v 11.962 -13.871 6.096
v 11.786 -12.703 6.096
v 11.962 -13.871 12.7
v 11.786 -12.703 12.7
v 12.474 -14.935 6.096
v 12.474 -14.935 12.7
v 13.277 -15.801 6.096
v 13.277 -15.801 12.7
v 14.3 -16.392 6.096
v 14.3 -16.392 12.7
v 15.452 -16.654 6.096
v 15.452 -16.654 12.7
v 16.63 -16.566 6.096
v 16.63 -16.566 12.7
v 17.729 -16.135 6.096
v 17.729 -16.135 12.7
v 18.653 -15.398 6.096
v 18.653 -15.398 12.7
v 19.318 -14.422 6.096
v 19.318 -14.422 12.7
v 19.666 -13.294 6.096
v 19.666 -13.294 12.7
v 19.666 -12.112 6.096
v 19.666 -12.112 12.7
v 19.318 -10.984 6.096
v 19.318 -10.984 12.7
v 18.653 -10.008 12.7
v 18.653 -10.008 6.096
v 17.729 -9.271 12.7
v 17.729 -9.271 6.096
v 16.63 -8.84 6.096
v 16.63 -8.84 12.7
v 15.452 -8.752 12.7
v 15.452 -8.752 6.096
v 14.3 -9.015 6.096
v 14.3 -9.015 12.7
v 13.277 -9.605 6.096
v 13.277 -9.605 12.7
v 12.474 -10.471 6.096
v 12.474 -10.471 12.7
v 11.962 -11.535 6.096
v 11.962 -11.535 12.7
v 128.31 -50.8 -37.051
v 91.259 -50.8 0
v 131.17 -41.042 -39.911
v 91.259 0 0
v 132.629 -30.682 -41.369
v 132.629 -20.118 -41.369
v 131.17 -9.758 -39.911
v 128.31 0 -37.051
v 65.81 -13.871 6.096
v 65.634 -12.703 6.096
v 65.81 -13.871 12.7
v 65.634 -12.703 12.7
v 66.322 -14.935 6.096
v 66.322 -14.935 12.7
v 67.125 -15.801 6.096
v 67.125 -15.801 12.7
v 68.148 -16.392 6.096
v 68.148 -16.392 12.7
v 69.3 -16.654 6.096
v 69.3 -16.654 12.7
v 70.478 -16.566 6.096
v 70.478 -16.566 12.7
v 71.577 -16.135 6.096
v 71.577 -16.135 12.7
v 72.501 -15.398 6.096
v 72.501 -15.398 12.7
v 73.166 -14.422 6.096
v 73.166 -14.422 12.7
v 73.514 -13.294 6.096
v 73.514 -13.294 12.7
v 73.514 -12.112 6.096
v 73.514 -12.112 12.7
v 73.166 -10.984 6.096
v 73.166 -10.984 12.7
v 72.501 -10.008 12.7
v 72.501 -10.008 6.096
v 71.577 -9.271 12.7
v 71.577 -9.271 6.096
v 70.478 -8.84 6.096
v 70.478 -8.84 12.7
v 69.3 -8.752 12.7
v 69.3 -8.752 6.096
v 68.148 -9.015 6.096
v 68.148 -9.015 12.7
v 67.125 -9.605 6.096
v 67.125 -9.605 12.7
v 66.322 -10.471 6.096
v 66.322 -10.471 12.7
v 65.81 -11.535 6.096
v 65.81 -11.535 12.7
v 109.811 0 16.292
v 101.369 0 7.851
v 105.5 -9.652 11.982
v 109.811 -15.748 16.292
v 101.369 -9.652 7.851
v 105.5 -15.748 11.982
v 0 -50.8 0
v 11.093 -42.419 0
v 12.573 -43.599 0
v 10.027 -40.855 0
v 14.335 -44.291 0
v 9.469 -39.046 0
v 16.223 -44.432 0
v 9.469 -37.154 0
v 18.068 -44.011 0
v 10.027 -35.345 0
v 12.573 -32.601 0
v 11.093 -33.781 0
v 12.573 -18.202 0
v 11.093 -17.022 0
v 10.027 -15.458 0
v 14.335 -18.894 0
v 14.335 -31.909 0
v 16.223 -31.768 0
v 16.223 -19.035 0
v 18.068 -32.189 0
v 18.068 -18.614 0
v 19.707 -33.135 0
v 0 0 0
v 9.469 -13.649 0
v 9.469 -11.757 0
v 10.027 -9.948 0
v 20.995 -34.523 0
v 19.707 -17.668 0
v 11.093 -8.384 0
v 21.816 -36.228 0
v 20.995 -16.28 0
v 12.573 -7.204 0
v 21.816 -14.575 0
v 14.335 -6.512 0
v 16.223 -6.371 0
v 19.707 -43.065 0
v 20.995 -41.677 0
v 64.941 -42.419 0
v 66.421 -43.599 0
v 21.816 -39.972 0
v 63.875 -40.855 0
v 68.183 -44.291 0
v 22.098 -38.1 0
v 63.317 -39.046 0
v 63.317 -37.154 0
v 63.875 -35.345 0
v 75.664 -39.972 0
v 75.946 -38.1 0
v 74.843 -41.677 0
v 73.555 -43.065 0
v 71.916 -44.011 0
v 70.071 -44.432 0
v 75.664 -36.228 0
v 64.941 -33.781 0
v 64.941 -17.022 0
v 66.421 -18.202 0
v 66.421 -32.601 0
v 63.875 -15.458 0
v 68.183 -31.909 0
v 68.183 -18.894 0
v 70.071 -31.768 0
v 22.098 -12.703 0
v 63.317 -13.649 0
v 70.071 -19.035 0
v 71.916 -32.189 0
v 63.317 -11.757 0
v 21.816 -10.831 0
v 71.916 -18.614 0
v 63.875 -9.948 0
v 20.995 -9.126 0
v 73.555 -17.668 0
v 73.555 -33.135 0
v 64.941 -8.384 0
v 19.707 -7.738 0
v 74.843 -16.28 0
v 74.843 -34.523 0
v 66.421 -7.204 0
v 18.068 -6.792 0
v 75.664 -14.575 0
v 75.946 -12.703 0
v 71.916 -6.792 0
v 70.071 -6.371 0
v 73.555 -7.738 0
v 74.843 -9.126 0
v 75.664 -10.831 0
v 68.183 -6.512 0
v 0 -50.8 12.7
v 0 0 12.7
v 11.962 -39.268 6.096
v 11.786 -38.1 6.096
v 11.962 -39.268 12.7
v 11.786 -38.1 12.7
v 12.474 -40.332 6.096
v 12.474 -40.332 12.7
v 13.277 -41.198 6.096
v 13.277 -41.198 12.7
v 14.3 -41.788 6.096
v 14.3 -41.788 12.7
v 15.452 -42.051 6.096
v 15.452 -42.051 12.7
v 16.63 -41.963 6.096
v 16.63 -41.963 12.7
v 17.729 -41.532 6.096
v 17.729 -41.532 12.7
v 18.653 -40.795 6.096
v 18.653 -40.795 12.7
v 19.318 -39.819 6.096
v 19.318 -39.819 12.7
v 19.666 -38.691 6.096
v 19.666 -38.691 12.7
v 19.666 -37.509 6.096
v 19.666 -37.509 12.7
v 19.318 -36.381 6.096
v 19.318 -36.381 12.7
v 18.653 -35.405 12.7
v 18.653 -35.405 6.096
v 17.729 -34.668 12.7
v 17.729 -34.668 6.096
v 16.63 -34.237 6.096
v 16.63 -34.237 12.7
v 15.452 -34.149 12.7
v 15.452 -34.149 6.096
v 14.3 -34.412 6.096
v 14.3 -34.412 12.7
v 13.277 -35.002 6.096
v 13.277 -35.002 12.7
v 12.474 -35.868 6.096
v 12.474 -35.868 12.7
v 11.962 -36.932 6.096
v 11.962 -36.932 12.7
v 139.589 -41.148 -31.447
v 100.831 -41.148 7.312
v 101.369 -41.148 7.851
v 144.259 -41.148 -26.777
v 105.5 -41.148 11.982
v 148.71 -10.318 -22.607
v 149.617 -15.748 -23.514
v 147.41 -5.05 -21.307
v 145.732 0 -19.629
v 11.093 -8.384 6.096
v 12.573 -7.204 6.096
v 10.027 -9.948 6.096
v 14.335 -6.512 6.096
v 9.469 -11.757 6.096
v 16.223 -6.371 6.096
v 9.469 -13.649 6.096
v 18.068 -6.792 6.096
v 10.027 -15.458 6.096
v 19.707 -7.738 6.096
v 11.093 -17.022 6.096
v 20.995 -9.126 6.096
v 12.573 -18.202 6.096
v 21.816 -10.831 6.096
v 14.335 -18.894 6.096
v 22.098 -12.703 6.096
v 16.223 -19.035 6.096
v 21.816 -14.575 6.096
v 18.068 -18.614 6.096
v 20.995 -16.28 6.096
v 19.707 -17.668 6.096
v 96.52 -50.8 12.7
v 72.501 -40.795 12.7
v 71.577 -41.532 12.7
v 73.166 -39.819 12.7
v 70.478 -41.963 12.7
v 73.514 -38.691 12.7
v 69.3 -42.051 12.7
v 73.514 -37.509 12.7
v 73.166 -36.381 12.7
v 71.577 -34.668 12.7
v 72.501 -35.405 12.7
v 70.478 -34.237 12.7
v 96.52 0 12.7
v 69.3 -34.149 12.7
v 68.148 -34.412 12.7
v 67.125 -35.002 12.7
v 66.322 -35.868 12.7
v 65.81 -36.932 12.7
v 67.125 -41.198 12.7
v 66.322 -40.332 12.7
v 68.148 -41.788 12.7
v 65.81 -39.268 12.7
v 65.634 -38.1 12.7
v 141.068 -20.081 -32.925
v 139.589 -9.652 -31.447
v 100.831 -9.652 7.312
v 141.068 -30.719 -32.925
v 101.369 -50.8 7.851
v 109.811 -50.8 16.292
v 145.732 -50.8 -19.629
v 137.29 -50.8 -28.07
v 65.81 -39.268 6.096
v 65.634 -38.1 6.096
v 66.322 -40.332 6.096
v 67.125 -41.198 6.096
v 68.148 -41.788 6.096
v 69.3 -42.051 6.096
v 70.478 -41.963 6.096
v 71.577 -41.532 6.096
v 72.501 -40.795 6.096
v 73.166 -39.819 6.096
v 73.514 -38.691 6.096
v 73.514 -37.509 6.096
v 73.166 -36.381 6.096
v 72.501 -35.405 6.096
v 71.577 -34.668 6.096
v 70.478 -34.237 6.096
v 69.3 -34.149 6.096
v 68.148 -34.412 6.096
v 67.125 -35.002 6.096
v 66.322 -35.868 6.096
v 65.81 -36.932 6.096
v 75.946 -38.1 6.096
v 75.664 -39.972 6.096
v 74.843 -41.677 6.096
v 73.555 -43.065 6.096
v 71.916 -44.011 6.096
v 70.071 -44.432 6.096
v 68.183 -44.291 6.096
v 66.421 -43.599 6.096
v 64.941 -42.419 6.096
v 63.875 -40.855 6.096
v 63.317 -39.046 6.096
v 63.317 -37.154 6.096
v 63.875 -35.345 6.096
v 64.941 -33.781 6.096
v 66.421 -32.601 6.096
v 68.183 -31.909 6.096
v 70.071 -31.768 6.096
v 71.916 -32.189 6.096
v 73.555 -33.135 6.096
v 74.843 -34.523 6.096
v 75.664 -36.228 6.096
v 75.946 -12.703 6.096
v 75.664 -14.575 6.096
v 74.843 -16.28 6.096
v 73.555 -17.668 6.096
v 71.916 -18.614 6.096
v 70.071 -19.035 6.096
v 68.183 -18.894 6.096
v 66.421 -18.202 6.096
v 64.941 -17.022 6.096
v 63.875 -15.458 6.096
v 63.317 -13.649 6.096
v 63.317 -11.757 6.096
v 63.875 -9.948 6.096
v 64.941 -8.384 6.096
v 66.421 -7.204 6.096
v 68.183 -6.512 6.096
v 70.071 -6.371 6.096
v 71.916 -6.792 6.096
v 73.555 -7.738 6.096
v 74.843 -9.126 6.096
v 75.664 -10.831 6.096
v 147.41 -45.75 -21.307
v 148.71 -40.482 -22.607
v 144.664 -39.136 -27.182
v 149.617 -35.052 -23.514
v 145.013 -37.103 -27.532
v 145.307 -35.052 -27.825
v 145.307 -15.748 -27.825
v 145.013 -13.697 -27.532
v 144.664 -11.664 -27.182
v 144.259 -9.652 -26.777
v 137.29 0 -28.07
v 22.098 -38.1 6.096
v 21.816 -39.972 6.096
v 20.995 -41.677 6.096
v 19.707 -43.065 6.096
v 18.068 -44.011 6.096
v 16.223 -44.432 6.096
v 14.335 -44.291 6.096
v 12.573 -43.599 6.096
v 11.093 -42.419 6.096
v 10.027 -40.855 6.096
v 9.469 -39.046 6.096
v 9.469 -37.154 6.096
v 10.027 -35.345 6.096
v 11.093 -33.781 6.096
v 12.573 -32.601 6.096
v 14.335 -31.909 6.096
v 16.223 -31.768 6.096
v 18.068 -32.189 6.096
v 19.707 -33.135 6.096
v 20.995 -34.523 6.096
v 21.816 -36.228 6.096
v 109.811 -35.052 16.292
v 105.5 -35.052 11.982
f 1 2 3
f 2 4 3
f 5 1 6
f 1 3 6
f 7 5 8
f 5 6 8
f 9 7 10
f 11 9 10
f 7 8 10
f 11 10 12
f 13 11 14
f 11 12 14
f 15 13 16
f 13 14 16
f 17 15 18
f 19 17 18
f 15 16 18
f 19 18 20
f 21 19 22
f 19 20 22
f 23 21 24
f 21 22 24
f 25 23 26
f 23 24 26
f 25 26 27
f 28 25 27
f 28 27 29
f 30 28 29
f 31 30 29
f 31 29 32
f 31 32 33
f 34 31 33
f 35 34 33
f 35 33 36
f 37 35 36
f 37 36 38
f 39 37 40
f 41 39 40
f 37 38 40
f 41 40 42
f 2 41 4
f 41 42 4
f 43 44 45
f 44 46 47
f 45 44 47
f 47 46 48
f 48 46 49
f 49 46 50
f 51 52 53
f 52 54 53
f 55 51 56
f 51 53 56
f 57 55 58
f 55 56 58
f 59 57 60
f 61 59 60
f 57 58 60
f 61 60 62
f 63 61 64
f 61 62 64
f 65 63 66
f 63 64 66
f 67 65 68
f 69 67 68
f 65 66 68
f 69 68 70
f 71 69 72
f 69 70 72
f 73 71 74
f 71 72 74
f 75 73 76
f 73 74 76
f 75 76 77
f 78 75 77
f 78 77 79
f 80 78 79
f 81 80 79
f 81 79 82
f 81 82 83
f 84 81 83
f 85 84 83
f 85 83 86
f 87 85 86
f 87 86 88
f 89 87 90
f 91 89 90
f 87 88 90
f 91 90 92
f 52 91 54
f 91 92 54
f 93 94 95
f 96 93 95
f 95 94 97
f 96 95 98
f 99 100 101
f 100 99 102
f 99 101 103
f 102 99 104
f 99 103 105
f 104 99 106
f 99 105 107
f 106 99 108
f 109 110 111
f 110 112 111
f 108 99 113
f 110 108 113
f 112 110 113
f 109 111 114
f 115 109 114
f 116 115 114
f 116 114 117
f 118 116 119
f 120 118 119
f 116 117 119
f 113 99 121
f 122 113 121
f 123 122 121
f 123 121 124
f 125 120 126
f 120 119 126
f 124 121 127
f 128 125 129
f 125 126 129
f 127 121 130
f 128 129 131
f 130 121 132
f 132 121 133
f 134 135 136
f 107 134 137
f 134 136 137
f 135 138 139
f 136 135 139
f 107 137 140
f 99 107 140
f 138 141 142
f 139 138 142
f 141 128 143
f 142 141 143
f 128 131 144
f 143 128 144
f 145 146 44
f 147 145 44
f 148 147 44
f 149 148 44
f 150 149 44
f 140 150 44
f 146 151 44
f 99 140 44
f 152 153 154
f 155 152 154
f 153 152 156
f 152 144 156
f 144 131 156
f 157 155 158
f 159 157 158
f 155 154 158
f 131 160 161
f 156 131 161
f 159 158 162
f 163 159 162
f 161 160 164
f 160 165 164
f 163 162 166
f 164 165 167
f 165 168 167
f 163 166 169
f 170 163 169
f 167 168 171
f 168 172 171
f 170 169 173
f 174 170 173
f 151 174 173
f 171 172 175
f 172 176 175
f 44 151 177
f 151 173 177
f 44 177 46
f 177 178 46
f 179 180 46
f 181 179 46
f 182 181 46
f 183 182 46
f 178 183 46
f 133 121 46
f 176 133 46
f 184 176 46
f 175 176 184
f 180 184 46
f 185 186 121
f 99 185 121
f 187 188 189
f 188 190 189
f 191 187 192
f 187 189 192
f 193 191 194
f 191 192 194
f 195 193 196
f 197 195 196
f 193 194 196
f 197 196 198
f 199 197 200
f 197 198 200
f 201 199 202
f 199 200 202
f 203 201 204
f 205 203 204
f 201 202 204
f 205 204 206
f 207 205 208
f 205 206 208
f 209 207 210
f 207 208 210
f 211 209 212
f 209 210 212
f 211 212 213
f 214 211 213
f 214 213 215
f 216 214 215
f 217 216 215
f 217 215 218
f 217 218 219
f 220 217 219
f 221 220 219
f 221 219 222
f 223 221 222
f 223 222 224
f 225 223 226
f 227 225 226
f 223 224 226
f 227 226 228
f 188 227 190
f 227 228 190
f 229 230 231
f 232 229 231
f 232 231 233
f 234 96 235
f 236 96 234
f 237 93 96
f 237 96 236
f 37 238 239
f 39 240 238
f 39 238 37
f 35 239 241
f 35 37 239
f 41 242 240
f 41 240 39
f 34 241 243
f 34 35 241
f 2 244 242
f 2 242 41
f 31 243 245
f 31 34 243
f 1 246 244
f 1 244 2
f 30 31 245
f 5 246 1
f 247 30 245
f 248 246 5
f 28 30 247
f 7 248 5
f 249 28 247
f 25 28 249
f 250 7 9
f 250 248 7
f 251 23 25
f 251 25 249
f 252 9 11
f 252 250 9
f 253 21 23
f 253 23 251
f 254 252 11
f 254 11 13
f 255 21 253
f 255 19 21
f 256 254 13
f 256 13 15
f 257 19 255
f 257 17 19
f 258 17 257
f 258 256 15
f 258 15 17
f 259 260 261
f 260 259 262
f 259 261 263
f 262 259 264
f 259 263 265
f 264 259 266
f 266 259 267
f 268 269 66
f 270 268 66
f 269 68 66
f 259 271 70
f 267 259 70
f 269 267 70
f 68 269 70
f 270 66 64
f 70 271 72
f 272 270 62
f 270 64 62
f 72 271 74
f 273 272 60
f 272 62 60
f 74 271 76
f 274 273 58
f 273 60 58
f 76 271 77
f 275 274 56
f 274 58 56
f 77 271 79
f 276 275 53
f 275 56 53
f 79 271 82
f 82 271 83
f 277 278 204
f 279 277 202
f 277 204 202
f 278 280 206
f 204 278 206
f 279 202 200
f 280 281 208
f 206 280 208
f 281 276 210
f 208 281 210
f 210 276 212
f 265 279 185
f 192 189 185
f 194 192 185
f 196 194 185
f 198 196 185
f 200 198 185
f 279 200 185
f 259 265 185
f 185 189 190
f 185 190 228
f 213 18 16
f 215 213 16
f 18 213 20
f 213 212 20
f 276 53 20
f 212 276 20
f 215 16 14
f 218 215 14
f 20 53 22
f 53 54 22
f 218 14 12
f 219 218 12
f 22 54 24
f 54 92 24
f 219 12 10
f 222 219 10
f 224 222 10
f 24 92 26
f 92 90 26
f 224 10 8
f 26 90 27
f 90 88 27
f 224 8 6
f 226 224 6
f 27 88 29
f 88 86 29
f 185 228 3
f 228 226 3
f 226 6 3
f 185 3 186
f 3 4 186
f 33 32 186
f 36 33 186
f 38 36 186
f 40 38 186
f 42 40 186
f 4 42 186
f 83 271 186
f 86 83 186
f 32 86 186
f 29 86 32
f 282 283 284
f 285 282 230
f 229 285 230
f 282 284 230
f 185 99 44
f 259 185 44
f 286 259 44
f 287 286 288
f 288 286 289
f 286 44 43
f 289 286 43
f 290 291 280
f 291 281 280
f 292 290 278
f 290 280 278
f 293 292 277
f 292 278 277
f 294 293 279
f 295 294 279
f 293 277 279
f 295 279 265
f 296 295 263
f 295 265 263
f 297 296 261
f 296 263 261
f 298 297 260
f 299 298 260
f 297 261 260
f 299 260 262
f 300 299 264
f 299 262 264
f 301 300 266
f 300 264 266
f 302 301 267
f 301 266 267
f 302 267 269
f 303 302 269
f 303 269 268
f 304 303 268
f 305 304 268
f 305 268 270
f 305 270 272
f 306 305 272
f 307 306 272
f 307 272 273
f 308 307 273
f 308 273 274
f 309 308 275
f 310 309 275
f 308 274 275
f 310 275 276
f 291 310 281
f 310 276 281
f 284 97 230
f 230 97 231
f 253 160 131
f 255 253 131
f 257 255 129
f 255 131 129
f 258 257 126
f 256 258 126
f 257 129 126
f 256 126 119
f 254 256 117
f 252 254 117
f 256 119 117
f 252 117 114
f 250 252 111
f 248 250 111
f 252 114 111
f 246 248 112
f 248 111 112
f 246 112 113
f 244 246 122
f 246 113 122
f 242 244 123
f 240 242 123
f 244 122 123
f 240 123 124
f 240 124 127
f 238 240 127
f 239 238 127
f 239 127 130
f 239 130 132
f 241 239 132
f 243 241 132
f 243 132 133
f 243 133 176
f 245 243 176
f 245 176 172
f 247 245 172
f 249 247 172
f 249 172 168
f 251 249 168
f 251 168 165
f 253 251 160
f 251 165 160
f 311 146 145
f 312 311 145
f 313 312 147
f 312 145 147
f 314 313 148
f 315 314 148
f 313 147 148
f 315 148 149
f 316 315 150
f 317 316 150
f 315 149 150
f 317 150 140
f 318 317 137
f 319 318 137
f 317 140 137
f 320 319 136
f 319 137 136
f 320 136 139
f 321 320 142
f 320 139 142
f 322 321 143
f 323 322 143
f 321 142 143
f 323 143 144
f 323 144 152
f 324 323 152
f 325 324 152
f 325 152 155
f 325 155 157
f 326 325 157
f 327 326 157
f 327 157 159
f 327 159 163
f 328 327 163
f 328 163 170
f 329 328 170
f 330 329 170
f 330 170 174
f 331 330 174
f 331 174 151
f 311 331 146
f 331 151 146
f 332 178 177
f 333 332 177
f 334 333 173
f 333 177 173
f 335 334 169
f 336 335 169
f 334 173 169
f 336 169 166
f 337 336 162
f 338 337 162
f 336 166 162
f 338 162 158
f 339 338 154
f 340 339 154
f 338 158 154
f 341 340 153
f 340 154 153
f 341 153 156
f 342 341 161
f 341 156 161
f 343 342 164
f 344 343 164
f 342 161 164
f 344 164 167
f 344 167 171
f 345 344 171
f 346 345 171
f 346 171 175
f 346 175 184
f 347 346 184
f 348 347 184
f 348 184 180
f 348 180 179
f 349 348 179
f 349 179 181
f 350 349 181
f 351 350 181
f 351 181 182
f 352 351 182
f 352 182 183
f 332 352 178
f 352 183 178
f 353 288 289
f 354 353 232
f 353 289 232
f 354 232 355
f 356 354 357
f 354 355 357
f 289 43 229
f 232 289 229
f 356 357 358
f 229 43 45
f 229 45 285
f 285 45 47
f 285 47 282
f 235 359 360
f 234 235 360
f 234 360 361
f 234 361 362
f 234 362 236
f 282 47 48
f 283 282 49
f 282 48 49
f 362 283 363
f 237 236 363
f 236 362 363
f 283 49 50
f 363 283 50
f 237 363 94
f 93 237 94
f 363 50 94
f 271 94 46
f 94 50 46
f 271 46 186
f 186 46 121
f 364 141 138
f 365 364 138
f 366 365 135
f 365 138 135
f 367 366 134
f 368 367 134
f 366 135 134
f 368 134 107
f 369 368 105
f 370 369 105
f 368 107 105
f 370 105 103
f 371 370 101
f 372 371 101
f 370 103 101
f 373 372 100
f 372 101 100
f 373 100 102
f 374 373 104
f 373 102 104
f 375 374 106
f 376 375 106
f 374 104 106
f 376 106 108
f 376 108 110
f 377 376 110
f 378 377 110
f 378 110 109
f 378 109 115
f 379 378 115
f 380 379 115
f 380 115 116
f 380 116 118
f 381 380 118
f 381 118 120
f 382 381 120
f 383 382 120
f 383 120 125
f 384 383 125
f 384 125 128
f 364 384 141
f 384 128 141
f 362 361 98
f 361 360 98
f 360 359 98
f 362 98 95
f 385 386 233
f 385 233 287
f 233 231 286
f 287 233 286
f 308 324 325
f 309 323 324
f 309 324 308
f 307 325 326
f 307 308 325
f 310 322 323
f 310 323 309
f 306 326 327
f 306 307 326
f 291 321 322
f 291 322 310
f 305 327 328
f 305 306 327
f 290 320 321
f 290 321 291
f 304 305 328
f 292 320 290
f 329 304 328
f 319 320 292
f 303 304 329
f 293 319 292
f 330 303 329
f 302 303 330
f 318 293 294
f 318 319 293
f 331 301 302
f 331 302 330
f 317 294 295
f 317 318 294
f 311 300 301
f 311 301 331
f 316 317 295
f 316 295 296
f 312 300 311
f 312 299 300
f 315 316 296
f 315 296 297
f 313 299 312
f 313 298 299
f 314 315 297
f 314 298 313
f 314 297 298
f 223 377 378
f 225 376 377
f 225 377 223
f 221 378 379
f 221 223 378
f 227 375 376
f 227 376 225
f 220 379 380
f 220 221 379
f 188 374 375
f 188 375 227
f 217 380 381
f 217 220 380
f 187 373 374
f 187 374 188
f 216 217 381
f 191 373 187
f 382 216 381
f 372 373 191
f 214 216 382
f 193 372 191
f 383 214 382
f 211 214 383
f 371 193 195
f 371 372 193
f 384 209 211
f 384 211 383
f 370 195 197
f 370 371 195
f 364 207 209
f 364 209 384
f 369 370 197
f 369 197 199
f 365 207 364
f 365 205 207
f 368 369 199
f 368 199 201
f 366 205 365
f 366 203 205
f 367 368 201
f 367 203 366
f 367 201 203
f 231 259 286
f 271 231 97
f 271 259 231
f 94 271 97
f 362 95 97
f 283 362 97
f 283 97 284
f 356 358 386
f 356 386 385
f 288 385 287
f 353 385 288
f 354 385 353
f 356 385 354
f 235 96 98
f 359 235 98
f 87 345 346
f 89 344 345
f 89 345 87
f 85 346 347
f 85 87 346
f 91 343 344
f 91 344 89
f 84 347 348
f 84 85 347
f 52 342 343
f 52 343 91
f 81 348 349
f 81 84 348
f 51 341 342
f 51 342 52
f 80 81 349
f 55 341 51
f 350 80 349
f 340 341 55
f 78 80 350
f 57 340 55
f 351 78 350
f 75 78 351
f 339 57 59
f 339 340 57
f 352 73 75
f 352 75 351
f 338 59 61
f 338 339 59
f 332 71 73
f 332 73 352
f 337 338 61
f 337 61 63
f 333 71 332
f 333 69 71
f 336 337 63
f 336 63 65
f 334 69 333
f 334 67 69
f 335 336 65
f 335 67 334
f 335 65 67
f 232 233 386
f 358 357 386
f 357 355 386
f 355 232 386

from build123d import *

# Parameters (mm, degrees)
F1_DEPTH        = 50.8
F3_DEPTH        = 12.7
F5_DEPTH        = 11.938
F7_DEPTH        = 76.2
F8_R            = 6.35
F9_DEPTH        = 6.096
F11_D           = 7.9248
F11_CBORE_D     = 12.7
F11_CBORE_DEPTH = 6.096


with BuildPart() as f1:
    # F0 (on Front) → F1 (new body)
    with BuildSketch(Plane.XZ):
        Polygon((0, 12.7), (0, 0), (91.2594877579, 0), (87.5397438789, 3.7197438789), (96.52, 12.7), align=None)
        Polygon((87.5397438789, 3.7197438789), (91.2594877579, 0), (96.52, 0), (96.52, 12.7), align=None)
        Polygon((96.52, 0), (91.2594877579, 0), (128.3101066686, -37.0506189107), (137.2903627897, -28.0703627897), (96.52, 12.7), align=None)
    extrude(amount=F1_DEPTH)

    # F2 (on face) → F3 (join)
    with BuildSketch(Plane(origin=(54.61, 0, 54.61), x_dir=(0.7071067812, 0, -0.7071067812), z_dir=(0.7071067812, 0, 0.7071067812))):
        with BuildLine():
            Line((116.9276903991, 0), (116.9276903991, -50.8))
            ThreePointArc((116.9276903991, -50.8), (123.2946720443, -25.4), (116.9276903991, 0))
        make_face()
    extrude(amount=-F3_DEPTH)

    # F4 (on face) → F5 (join)
    with BuildSketch(Plane(origin=(54.61, 0, 54.61), x_dir=(0.7071067812, 0, -0.7071067812), z_dir=(0.7071067812, 0, 0.7071067812))):
        with BuildLine():
            Line((66.1276903991, -50.8), (116.9276903991, -50.8))
            ThreePointArc((116.9276903991, -50.8), (123.2946720443, -25.4), (116.9276903991, 0))
            Line((116.9276903991, 0), (66.1276903991, 0))
            Line((66.1276903991, 0), (66.1276903991, -50.8))
        make_face()
    extrude(amount=F5_DEPTH)

    # F6 (on face) → F7 (cut)
    with BuildSketch(Plane(origin=(46.7593383054, 0, -46.7593383054), x_dir=(0, -1, 0), z_dir=(-0.7071067812, 0, 0.7071067812))):
        Polygon((35.052, 89.1682026412), (25.4, 89.1682026412), (15.748, 89.1682026412), (15.748, 83.0722026412), (9.652, 83.0722026412), (9.652, 76.4682026412), (41.148, 76.4682026412), (41.148, 83.0722026412), (35.052, 83.0722026412), align=None)
    extrude(amount=-F7_DEPTH, mode=Mode.SUBTRACT)

    # F8 (on face) → F9 (cut)
    with BuildSketch(Plane(origin=(0, 0, 0), x_dir=(1, 0, 0), z_dir=(0, 0, -1))):
        with Locations((15.748, 38.1)):
            Circle(F8_R)
        with Locations((15.748, 12.7030098811)):
            Circle(F8_R)
        with Locations((69.596, 38.1)):
            Circle(F8_R)
        with Locations((69.596, 12.7030098811)):
            Circle(F8_R)
    extrude(amount=-F9_DEPTH, mode=Mode.SUBTRACT)

    # F11 (through all)
    with Locations(Plane(origin=(0, 0, 0), x_dir=(1, 0, 0), z_dir=(0, 0, -1))):
        with Locations((15.748, 38.1), (69.596, 38.1), (69.596, 12.7030098811), (15.748, 12.7030098811)):
            CounterBoreHole(F11_D / 2, F11_CBORE_D / 2, F11_CBORE_DEPTH)


solid = f1.part
